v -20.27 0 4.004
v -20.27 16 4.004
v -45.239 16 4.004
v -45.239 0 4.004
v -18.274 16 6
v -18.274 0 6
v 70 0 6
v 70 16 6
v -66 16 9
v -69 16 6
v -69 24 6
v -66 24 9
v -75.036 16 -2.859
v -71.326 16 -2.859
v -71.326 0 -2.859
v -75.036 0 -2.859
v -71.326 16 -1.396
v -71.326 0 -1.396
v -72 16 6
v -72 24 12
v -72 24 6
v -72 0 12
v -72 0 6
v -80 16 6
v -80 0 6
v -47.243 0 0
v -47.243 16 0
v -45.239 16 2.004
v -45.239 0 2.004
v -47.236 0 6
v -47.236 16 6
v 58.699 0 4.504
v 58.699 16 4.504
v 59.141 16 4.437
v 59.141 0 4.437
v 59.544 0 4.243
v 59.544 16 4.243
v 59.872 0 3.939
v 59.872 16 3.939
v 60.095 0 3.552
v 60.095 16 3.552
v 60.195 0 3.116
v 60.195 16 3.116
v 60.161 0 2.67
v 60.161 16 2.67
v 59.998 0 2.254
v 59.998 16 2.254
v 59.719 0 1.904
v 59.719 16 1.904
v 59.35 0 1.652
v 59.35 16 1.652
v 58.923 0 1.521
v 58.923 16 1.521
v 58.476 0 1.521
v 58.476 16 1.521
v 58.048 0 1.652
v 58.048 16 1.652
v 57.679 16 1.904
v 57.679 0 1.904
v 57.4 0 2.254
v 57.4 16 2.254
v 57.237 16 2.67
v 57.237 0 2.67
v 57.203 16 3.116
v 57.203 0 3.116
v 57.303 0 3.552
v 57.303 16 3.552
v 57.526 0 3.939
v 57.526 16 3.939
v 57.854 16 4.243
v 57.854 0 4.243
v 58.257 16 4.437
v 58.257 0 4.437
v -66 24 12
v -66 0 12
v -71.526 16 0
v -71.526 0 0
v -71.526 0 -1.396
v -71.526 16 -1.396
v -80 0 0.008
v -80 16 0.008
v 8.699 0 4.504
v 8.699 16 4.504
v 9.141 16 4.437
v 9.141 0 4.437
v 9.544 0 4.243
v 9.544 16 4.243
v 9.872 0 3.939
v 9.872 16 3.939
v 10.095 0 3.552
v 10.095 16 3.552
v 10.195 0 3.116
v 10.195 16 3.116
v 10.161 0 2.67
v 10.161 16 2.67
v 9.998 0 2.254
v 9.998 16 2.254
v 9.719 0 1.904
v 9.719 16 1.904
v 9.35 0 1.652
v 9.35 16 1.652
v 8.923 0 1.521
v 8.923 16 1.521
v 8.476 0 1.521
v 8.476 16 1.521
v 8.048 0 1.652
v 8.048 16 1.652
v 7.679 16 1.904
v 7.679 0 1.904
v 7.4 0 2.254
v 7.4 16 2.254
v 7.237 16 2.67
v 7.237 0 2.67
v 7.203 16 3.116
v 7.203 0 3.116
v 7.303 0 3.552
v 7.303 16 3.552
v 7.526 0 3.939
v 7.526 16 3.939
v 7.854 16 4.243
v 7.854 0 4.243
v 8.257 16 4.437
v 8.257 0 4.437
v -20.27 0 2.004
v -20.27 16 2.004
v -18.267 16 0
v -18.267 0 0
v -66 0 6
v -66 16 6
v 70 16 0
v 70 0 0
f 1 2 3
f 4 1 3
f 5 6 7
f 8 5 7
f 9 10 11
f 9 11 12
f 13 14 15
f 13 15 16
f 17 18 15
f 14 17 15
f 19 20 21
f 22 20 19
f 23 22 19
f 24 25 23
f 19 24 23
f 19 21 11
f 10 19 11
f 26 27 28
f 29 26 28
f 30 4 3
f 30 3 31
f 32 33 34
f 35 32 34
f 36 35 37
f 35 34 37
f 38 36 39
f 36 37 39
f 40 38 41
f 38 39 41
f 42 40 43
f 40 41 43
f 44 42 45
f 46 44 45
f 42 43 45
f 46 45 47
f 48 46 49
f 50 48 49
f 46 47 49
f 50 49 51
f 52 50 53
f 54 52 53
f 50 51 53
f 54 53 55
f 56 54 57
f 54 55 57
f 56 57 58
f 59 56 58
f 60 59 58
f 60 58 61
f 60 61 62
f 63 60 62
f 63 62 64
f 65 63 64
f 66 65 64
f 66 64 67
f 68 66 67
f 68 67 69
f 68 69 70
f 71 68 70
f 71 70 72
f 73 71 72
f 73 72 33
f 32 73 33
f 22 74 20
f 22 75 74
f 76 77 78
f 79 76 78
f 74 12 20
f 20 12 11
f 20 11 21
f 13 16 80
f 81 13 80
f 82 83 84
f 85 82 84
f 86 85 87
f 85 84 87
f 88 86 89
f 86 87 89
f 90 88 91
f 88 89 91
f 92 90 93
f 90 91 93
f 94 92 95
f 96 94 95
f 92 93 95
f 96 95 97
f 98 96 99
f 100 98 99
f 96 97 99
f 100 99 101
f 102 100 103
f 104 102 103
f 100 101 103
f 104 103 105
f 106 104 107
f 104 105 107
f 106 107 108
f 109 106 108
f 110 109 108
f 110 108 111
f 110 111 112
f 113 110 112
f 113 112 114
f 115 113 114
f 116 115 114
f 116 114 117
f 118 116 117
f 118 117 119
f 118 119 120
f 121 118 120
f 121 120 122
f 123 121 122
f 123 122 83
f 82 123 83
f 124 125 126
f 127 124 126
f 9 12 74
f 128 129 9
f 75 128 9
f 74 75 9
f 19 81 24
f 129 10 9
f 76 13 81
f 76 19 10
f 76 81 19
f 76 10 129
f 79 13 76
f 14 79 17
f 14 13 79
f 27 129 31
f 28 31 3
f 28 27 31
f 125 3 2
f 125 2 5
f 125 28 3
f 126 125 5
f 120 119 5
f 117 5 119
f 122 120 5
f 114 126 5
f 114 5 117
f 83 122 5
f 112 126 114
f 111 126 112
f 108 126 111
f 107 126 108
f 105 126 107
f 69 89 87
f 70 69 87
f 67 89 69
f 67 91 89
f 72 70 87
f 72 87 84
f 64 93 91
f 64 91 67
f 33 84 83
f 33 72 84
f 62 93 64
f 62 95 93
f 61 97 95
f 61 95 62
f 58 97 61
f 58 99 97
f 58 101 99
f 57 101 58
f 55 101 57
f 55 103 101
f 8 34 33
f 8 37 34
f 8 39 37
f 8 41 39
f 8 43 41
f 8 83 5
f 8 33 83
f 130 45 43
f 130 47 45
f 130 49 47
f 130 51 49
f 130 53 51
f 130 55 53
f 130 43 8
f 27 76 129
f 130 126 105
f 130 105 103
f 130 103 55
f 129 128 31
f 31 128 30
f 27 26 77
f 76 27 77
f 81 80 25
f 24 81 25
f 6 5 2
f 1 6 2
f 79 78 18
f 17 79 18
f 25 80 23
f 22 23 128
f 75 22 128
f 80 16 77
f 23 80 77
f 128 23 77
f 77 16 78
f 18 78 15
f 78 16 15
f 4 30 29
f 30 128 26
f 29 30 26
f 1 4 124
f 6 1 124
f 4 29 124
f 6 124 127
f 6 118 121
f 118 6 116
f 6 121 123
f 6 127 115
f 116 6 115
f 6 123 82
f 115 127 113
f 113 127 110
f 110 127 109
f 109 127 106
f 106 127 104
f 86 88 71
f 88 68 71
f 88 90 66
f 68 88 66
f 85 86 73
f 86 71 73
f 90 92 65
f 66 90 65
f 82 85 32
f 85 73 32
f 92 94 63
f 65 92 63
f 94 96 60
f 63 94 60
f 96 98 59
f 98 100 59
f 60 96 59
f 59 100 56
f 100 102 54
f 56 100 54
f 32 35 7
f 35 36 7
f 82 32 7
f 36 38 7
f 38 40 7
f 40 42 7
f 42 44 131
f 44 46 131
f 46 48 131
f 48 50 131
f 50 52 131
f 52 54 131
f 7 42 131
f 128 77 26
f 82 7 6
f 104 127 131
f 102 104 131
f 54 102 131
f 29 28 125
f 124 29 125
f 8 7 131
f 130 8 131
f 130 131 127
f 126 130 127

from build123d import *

# Parameters (mm, degrees)
EXTRUDE_1_DEPTH     = 16
SKETCH_3_R          = 1.5
CUT_EXTRUDE_1_DEPTH = 82.804645345
SKETCH_4_W          = 6
SKETCH_4_H          = 6
EXTRUDE_2_DEPTH     = 16
EXTRUDE_3_DEPTH     = 8


with BuildPart() as part:
    # Эскиз1 → Бобышка-Вытянуть1 (new body)
    with BuildSketch(Plane(origin=(0, 0, 0), x_dir=(1, 0, 0), z_dir=(0, 1, 0))):
        Polygon((0, 0), (-71.525936721, 0), (-71.525936721, 1.396480231), (-71.325936721, 1.396480231), (-71.325936721, 2.8586364), (-75.035652424, 2.8586364), (-80, -0.007531009), (-80, -6), (70, -6), (70, 0), align=None)
    extrude(amount=EXTRUDE_1_DEPTH)

    # Эскиз3 → Вырез-Вытянуть1 (cut, through all)
    with BuildSketch(Plane(origin=(0, 16, 0), x_dir=(1, 0, 0), z_dir=(0, 1, 0))):
        with Locations(Location((8.699103215, -3.003765504, 0), (0, 0, 270))):
            Circle(SKETCH_3_R)
        with Locations(Location((58.699103215, -3.003765504, 0), (0, 0, 270))):
            Circle(SKETCH_3_R)
        Polygon((-47.243192472, 0), (-45.239426968, -2.003765504), (-20.270391363, -2.003765504), (-18.266625858, 0), align=None)
        Polygon((-47.243192472, -6.007531009), (-18.266625858, -6.007531009), (-20.270391363, -4.003765504), (-45.239426968, -4.003765504), align=None)
    extrude(amount=-CUT_EXTRUDE_1_DEPTH, mode=Mode.SUBTRACT)

    # Эскиз4 → Бобышка-Вытянуть2 (add)
    with BuildSketch(Plane.XZ):
        with Locations((-69, 9)):
            Rectangle(SKETCH_4_W, SKETCH_4_H)
    extrude(amount=-EXTRUDE_2_DEPTH)

    # Эскиз5 → Бобышка-Вытянуть3 (add)
    with BuildSketch(Plane(origin=(0, 16, 0), x_dir=(1, 0, 0), z_dir=(0, 1, 0))):
        Polygon((-72, -12), (-72, -6), (-69, -6), (-66, -9), (-66, -12), align=None)
    extrude(amount=EXTRUDE_3_DEPTH)


solid = part.part
